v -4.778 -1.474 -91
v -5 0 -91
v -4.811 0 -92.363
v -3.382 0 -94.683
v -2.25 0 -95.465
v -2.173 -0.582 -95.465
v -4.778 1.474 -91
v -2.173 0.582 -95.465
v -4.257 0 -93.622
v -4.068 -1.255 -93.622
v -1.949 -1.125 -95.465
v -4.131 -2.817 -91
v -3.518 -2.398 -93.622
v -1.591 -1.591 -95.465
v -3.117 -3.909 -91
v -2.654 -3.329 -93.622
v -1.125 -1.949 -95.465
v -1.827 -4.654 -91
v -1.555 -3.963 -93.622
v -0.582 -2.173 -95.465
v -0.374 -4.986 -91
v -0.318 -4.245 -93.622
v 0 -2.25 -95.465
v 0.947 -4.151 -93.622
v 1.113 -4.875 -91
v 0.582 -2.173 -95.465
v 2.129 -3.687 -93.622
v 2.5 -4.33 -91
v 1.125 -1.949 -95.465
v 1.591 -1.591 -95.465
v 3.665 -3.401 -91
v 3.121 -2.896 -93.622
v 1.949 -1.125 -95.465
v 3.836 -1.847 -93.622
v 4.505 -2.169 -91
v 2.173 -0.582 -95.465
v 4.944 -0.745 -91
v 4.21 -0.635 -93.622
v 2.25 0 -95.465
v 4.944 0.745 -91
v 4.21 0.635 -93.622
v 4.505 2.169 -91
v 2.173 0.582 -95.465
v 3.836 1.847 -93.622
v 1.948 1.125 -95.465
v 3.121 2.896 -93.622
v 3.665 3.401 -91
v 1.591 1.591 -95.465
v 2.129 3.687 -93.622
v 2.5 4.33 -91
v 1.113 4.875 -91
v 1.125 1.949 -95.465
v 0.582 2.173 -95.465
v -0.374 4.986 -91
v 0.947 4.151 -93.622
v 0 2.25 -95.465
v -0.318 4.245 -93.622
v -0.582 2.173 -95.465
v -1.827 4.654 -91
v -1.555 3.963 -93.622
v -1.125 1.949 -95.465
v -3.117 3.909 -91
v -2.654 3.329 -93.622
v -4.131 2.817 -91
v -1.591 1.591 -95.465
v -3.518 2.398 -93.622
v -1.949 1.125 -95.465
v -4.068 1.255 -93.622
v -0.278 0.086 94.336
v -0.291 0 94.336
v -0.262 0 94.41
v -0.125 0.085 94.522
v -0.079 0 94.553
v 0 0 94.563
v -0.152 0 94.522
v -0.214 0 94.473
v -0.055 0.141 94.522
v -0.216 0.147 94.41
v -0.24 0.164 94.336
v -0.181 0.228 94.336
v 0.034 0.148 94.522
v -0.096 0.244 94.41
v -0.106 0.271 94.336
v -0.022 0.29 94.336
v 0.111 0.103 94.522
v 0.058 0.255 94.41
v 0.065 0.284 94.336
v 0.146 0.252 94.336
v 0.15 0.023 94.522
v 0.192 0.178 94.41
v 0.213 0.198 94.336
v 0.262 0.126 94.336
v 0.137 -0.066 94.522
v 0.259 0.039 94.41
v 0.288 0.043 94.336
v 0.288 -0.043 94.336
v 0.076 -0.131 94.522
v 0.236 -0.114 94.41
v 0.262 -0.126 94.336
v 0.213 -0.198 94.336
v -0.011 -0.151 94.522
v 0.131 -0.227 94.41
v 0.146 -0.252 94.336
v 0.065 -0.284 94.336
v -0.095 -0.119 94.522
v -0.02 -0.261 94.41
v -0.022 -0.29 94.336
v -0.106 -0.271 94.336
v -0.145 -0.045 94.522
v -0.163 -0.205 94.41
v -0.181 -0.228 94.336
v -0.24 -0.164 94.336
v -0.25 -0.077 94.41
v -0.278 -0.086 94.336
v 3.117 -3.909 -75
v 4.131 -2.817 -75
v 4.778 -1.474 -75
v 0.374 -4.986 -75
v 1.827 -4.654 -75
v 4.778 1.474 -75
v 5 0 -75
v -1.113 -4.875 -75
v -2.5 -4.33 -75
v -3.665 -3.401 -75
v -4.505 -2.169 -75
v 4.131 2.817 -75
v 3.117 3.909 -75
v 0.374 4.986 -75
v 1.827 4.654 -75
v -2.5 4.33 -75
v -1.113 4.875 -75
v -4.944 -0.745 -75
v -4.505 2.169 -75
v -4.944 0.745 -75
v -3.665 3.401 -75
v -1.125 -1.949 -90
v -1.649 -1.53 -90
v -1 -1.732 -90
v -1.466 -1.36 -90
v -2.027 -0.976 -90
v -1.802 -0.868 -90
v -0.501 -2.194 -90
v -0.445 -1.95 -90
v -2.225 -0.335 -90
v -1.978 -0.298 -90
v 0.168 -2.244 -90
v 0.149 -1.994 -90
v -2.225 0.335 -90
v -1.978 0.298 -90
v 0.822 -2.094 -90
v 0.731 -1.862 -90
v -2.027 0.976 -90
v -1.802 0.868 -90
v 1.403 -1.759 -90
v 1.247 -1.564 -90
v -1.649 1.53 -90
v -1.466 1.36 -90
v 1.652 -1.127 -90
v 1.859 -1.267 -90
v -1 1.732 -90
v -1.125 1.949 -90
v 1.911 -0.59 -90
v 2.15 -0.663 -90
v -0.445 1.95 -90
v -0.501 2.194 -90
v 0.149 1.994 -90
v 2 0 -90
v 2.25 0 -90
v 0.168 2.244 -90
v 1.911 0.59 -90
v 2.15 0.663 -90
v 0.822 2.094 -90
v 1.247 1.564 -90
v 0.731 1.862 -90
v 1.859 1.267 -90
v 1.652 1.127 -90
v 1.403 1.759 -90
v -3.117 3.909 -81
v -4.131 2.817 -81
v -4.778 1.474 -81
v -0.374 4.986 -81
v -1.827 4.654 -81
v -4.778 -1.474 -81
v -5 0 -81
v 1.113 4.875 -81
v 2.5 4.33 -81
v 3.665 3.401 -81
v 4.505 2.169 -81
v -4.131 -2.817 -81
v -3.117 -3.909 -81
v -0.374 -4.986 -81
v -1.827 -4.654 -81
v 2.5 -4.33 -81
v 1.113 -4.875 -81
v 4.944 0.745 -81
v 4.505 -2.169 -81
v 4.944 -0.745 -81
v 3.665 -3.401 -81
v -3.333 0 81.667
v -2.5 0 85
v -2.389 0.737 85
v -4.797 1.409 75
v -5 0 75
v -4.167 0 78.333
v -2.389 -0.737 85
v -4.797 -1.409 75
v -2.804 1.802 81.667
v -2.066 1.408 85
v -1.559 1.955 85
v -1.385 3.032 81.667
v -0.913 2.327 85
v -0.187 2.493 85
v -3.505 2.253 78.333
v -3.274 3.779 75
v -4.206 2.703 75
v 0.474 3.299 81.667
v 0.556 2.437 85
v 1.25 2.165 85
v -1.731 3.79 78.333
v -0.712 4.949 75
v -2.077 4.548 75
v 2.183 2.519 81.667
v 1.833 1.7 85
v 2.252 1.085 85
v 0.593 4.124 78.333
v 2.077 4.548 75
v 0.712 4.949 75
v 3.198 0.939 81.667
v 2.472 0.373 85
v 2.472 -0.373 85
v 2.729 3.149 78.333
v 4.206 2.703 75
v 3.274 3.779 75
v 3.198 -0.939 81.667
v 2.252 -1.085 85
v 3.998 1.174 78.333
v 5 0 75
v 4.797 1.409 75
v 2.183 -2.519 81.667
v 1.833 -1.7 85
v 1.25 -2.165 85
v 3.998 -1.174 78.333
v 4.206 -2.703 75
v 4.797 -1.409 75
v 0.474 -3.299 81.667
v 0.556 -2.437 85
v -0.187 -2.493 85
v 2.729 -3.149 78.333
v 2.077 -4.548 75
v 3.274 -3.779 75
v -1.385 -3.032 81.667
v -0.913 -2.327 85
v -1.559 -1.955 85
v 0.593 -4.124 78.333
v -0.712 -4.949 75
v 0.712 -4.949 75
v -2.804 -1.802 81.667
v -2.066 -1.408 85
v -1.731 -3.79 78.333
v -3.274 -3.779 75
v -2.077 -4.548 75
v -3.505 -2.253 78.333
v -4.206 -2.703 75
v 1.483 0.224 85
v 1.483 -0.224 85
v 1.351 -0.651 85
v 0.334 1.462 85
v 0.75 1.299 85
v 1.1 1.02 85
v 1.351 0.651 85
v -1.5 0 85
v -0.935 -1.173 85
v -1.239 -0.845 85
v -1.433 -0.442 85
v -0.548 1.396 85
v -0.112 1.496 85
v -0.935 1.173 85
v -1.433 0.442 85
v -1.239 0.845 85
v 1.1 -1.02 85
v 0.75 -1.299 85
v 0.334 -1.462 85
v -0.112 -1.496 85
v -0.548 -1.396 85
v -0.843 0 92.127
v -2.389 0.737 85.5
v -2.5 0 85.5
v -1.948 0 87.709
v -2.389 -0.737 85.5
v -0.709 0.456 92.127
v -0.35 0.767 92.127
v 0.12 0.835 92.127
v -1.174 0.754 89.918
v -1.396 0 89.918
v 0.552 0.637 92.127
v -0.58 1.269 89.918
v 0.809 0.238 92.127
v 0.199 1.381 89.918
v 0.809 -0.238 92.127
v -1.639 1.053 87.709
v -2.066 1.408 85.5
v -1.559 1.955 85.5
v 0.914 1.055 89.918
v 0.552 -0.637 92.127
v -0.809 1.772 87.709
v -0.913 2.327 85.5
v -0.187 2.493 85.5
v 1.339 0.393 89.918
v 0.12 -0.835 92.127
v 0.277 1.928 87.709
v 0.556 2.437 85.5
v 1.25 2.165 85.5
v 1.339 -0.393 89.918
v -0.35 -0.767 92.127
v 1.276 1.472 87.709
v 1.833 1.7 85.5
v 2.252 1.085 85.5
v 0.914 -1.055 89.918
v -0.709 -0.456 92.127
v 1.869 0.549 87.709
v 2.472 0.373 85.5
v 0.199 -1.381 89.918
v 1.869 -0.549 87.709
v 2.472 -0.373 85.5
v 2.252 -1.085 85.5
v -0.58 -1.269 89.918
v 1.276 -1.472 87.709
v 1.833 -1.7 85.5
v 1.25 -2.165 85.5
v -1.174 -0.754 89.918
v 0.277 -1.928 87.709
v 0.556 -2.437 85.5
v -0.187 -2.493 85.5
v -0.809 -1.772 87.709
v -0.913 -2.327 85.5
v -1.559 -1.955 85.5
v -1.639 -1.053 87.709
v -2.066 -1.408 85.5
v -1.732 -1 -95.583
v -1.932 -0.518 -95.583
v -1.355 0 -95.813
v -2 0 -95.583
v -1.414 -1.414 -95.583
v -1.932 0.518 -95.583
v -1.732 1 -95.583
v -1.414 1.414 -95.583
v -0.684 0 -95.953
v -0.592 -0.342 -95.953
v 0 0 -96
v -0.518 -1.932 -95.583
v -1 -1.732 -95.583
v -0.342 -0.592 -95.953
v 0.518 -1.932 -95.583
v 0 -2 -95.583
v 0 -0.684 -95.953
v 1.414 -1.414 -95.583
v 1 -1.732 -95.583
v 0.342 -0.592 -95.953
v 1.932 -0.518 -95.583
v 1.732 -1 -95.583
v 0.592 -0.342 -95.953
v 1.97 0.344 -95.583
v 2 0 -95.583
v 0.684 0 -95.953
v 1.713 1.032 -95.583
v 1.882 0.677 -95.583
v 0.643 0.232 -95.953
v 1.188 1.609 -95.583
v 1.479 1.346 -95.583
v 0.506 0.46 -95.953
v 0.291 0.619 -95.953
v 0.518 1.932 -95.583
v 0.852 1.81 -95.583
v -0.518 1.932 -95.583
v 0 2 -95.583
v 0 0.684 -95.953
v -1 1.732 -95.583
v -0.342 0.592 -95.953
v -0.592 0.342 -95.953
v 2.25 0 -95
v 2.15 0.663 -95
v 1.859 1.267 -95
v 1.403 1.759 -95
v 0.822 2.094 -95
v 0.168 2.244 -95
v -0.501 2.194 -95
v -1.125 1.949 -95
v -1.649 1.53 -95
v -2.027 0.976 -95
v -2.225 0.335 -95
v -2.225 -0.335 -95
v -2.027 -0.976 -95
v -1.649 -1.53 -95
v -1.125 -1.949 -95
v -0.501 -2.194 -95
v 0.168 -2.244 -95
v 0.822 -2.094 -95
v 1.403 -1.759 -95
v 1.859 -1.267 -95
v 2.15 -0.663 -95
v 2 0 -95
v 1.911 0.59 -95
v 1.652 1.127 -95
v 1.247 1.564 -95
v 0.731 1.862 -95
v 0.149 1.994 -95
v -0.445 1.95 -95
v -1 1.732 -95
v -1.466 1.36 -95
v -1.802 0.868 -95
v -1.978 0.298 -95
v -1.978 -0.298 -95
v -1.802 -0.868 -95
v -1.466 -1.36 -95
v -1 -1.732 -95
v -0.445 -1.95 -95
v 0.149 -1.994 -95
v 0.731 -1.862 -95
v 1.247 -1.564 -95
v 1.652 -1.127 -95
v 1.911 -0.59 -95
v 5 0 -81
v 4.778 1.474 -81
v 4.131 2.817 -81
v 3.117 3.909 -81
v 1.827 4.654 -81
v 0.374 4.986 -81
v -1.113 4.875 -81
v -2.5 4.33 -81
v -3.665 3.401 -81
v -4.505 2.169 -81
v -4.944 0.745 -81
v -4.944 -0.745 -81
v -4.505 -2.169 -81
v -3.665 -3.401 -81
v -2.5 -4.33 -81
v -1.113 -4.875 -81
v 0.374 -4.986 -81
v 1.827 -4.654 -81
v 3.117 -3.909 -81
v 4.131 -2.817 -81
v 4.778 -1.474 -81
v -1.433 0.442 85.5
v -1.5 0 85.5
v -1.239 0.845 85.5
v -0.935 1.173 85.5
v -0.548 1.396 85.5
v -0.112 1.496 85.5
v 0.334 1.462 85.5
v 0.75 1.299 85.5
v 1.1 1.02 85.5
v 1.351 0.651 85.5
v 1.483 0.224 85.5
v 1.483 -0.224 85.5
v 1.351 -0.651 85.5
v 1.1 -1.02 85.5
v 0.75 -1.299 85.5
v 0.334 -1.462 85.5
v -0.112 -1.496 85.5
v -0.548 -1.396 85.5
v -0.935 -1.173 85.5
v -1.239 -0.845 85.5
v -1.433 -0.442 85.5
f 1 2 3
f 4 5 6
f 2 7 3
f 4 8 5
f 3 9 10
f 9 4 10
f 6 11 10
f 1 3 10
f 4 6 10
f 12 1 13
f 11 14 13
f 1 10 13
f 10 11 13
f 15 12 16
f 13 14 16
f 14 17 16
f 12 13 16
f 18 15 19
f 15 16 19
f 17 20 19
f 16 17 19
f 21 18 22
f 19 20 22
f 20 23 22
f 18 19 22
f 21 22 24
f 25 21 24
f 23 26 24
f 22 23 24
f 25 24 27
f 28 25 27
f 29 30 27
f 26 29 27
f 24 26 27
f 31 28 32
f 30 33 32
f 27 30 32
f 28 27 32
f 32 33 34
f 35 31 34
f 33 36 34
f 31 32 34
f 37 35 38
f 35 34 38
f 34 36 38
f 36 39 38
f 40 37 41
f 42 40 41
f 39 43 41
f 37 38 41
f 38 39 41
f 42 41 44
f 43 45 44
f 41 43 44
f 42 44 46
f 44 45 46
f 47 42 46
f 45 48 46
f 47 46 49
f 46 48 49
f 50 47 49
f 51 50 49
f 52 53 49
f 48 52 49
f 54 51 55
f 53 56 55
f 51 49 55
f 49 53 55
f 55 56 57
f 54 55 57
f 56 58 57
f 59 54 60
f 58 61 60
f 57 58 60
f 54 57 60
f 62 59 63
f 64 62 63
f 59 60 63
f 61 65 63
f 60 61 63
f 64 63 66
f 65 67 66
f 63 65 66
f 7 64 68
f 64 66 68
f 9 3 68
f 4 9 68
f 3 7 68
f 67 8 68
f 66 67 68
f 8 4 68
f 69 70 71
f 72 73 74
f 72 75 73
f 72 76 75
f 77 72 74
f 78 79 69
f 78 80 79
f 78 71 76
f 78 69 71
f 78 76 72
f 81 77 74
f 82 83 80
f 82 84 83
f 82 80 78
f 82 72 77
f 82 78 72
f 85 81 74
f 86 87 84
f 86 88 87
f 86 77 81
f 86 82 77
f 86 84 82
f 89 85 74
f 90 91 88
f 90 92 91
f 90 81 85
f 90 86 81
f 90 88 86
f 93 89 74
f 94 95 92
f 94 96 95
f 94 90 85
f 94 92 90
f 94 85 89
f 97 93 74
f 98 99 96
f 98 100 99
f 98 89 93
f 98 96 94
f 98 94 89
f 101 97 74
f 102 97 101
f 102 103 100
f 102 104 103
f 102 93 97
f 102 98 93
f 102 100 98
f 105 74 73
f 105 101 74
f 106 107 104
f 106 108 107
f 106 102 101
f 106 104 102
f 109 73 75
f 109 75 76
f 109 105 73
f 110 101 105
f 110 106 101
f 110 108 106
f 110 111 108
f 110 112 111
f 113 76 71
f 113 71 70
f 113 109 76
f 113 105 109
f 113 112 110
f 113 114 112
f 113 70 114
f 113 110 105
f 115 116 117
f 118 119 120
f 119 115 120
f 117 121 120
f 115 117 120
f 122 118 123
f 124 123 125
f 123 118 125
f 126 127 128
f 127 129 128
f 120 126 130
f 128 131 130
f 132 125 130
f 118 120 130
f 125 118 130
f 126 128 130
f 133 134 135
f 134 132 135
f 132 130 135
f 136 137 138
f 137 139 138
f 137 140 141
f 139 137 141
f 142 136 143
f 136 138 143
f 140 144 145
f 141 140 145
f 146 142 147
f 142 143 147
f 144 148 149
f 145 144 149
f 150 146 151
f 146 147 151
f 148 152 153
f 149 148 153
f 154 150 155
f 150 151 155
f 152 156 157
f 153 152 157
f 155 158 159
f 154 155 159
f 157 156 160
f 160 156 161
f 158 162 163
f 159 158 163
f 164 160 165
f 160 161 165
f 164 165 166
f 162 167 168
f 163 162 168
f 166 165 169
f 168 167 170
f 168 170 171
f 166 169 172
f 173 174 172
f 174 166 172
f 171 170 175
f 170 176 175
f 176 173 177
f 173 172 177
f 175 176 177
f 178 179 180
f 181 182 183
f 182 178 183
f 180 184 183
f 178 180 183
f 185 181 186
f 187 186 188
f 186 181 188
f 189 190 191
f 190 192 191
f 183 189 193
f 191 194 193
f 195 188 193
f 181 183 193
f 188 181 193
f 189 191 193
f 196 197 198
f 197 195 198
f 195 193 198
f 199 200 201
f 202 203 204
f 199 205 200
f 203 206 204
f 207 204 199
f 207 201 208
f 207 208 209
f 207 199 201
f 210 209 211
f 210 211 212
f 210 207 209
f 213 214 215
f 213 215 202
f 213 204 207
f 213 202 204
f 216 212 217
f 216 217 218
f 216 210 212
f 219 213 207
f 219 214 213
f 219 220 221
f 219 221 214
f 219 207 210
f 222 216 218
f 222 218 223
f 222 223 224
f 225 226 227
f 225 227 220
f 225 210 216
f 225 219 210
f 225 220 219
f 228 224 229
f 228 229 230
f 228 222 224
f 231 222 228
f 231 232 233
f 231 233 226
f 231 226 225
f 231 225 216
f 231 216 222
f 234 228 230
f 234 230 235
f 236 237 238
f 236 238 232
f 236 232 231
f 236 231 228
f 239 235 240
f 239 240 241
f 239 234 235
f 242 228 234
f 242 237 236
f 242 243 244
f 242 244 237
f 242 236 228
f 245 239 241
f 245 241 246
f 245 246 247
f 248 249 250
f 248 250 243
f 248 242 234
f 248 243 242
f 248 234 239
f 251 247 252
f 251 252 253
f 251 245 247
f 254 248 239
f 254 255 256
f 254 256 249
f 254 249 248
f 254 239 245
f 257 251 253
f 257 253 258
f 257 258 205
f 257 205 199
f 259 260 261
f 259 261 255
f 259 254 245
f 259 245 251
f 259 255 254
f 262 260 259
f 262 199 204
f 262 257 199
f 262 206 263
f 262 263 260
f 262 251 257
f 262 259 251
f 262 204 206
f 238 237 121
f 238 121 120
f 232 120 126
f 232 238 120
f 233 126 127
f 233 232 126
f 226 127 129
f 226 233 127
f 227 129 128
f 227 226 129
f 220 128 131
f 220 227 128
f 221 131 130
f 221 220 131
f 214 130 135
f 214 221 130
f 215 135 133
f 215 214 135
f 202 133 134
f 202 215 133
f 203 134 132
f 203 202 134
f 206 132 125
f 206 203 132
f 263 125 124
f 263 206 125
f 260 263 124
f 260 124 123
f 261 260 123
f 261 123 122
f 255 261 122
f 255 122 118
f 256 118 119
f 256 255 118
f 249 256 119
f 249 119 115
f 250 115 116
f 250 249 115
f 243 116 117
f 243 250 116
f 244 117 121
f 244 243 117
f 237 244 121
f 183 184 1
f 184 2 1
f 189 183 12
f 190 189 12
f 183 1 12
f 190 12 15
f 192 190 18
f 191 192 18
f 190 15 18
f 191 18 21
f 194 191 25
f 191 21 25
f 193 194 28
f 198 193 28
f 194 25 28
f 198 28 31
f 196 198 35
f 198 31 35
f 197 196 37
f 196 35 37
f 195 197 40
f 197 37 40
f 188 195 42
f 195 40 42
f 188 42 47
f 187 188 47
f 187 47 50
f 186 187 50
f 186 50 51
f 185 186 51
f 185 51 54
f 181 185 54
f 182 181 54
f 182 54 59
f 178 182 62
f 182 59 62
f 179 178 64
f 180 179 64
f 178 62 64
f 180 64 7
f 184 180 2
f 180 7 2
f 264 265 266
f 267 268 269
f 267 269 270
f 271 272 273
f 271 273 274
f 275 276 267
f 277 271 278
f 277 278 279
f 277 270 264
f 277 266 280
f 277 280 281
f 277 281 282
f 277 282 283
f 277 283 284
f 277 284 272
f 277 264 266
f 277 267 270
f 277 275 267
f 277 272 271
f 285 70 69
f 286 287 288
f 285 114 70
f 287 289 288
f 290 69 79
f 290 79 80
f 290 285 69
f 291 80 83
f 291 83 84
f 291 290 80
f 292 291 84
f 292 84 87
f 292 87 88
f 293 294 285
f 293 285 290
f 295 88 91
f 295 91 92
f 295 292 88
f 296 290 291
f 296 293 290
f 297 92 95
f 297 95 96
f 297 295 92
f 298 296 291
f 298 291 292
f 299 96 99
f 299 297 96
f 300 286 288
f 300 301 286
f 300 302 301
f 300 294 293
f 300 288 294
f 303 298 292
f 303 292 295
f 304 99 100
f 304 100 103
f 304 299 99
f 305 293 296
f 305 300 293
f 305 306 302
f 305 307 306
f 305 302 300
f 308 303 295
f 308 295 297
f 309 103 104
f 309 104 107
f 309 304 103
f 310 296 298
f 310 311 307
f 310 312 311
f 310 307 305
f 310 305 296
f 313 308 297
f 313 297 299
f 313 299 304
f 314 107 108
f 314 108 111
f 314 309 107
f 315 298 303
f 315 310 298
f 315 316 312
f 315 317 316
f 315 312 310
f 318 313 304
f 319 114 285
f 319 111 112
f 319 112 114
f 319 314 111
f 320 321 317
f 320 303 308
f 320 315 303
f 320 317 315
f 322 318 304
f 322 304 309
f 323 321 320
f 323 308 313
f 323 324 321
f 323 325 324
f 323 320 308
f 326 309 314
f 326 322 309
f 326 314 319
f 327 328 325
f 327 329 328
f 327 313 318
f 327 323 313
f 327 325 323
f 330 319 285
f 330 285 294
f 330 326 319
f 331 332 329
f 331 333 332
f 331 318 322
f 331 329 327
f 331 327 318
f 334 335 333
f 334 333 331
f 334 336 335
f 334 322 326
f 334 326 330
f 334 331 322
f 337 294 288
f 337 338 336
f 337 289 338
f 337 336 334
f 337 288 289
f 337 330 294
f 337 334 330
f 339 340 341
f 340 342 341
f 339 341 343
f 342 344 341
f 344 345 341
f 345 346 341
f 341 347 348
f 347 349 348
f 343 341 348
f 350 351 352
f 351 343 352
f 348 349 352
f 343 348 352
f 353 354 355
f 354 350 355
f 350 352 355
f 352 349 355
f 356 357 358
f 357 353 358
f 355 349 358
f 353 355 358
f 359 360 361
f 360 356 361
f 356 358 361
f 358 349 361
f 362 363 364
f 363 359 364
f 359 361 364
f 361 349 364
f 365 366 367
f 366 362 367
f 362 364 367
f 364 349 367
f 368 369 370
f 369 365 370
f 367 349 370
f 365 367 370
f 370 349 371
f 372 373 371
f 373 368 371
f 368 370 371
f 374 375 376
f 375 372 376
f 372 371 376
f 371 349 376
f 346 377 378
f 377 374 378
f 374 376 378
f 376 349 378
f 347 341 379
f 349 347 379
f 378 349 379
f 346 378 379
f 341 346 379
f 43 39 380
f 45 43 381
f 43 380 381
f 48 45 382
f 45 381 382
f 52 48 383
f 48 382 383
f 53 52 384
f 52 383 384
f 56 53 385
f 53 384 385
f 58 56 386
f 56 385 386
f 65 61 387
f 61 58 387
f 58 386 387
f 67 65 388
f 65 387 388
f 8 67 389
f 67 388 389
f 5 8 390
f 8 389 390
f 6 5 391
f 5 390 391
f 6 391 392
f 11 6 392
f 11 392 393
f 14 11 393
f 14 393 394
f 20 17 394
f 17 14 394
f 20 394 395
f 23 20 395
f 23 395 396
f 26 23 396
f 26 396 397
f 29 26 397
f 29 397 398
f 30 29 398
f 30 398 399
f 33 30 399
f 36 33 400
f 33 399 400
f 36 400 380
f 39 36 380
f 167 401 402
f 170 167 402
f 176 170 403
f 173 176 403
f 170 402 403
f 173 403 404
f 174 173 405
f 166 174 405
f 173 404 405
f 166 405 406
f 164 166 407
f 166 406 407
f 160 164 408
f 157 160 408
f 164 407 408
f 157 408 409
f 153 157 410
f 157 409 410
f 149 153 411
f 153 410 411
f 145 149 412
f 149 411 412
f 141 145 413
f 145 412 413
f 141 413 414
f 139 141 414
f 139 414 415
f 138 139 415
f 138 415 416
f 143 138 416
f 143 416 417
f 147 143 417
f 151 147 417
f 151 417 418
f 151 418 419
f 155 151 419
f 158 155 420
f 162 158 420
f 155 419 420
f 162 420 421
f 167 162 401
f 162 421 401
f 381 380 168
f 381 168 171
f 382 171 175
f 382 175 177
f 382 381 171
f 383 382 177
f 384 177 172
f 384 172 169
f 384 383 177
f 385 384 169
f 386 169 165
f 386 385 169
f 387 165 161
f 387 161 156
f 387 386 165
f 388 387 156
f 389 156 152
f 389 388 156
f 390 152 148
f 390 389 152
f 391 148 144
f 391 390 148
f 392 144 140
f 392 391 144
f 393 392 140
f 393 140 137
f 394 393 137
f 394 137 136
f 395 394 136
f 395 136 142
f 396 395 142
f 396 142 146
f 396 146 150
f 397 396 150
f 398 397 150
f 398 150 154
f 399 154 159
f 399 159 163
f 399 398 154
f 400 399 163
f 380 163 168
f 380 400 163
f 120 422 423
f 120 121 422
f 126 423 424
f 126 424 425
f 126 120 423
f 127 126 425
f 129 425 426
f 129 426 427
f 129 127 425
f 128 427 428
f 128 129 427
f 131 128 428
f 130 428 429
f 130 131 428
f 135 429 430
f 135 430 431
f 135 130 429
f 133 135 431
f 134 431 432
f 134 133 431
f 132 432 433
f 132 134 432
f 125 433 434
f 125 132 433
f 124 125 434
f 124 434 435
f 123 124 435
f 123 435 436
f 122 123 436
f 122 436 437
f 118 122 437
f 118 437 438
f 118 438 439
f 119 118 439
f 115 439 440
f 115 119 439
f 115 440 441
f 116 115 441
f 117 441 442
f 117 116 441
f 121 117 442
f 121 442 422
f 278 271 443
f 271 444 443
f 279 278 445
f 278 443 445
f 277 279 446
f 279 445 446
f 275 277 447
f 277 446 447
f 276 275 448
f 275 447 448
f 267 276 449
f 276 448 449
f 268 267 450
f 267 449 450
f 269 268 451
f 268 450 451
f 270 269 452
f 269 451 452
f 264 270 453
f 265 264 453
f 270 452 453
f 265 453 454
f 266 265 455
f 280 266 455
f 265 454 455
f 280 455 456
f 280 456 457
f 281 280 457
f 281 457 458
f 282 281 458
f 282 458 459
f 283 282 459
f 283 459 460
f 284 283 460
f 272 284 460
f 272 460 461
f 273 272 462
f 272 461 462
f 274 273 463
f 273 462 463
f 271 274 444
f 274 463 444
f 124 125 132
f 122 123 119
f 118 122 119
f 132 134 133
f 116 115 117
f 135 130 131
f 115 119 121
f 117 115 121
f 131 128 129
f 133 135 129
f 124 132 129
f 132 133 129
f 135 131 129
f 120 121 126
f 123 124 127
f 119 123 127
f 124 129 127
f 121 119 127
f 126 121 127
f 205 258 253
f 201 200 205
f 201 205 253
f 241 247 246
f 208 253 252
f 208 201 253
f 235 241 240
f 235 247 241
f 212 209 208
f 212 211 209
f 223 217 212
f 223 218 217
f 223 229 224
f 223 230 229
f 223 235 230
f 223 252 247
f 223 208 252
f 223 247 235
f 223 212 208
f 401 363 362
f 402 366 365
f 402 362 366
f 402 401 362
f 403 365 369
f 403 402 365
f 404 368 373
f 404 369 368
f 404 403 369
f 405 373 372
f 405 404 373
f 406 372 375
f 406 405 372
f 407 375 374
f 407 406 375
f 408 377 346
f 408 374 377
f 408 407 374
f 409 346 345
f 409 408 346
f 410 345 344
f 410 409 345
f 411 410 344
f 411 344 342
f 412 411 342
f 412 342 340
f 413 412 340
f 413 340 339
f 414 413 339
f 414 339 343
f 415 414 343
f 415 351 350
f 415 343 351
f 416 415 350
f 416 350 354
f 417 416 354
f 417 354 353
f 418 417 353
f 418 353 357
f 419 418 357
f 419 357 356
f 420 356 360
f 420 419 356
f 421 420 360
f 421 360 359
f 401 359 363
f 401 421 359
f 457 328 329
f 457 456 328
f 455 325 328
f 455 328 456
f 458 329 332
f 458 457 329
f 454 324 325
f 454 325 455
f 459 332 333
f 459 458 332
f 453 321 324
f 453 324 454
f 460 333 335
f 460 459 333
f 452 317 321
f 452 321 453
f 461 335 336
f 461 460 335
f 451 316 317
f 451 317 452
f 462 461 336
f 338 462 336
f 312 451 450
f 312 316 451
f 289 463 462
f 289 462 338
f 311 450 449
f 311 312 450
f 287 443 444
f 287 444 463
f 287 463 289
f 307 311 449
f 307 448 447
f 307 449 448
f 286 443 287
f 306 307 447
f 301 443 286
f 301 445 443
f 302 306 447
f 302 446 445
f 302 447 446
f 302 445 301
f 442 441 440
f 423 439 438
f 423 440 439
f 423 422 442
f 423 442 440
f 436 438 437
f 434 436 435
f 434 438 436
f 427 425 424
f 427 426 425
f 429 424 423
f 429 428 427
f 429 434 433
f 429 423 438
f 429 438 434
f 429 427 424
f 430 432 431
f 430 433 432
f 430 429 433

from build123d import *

# Parameters (mm, degrees)
F0_R           = 5
F1_DEPTH       = 75
F4_W           = 1.5
F4_H           = 0.5
F6_W           = 5
F6_H           = 6
F11_R          = 2.25
F11_R_2        = 2
F12_DEPTH      = 5
F12_DEPTH_BACK = 25


with BuildPart() as f1:
    # F0 (on Top) → F1 (new body, symmetric)
    with BuildSketch(Plane.XY):
        Circle(F0_R)
    extrude(amount=F1_DEPTH, both=True)

    # F2 (on Front) → F3 (revolve)
    with BuildSketch(Plane.XZ):
        Polygon((-2.5, 85), (-5, 75), (0, 75), (0, 85), align=None)
    revolve(axis=Axis((0, 0, 80), (0, 0, -1)))


with BuildPart() as f5:
    # F4 (on Front) → F5 (revolve)
    with BuildSketch(Plane.XZ):
        with Locations((-0.75, 85.25)):
            Rectangle(F4_W, F4_H)
        with BuildLine():
            Line((-0.291043, 94.335829), (-2.5, 85.5))
            Line((-2.5, 85.5), (-1.5, 85.5))
            Line((-1.5, 85.5), (0, 85.5))
            Line((0, 85.5), (0, 94.563068))
            ThreePointArc((0, 94.563068), (-0.184624, 94.49953), (-0.291043, 94.335829))
        make_face()
    revolve(axis=Axis((0, 0, 90.5), (0, 0, -1)))


with BuildPart() as f7:
    # F6 (on Front) → F7 (revolve)
    with BuildSketch(Plane.XZ):
        with Locations((2.5, -78)):
            Rectangle(F6_W, F6_H)
    revolve(axis=Axis((0, 0, -77.982798), (0, 0, 1)))


with BuildPart() as f9:
    # F8 (on Front) → F9 (revolve)
    with BuildSketch(Plane.XZ):
        with BuildLine():
            ThreePointArc((-5, -91), (-3.535534, -94.535534), (0, -96))
            Line((0, -96), (0, -81))
            Line((0, -81), (-5, -81))
            Line((-5, -81), (-5, -91))
        make_face()
    revolve(axis=Axis((0, 0, -88.5), (0, 0, 1)))

    # F11 (on offset) → F12 (cut, two sides)
    with BuildSketch(Plane.XY.offset(-94.999999)) as f12_sk:
        Circle(F11_R)
        Circle(F11_R_2, mode=Mode.SUBTRACT)
    extrude(amount=F12_DEPTH, mode=Mode.SUBTRACT)
    extrude(f12_sk.sketch, amount=-F12_DEPTH_BACK, mode=Mode.SUBTRACT)


solid = Compound([f1.part, f5.part, f7.part, f9.part])
